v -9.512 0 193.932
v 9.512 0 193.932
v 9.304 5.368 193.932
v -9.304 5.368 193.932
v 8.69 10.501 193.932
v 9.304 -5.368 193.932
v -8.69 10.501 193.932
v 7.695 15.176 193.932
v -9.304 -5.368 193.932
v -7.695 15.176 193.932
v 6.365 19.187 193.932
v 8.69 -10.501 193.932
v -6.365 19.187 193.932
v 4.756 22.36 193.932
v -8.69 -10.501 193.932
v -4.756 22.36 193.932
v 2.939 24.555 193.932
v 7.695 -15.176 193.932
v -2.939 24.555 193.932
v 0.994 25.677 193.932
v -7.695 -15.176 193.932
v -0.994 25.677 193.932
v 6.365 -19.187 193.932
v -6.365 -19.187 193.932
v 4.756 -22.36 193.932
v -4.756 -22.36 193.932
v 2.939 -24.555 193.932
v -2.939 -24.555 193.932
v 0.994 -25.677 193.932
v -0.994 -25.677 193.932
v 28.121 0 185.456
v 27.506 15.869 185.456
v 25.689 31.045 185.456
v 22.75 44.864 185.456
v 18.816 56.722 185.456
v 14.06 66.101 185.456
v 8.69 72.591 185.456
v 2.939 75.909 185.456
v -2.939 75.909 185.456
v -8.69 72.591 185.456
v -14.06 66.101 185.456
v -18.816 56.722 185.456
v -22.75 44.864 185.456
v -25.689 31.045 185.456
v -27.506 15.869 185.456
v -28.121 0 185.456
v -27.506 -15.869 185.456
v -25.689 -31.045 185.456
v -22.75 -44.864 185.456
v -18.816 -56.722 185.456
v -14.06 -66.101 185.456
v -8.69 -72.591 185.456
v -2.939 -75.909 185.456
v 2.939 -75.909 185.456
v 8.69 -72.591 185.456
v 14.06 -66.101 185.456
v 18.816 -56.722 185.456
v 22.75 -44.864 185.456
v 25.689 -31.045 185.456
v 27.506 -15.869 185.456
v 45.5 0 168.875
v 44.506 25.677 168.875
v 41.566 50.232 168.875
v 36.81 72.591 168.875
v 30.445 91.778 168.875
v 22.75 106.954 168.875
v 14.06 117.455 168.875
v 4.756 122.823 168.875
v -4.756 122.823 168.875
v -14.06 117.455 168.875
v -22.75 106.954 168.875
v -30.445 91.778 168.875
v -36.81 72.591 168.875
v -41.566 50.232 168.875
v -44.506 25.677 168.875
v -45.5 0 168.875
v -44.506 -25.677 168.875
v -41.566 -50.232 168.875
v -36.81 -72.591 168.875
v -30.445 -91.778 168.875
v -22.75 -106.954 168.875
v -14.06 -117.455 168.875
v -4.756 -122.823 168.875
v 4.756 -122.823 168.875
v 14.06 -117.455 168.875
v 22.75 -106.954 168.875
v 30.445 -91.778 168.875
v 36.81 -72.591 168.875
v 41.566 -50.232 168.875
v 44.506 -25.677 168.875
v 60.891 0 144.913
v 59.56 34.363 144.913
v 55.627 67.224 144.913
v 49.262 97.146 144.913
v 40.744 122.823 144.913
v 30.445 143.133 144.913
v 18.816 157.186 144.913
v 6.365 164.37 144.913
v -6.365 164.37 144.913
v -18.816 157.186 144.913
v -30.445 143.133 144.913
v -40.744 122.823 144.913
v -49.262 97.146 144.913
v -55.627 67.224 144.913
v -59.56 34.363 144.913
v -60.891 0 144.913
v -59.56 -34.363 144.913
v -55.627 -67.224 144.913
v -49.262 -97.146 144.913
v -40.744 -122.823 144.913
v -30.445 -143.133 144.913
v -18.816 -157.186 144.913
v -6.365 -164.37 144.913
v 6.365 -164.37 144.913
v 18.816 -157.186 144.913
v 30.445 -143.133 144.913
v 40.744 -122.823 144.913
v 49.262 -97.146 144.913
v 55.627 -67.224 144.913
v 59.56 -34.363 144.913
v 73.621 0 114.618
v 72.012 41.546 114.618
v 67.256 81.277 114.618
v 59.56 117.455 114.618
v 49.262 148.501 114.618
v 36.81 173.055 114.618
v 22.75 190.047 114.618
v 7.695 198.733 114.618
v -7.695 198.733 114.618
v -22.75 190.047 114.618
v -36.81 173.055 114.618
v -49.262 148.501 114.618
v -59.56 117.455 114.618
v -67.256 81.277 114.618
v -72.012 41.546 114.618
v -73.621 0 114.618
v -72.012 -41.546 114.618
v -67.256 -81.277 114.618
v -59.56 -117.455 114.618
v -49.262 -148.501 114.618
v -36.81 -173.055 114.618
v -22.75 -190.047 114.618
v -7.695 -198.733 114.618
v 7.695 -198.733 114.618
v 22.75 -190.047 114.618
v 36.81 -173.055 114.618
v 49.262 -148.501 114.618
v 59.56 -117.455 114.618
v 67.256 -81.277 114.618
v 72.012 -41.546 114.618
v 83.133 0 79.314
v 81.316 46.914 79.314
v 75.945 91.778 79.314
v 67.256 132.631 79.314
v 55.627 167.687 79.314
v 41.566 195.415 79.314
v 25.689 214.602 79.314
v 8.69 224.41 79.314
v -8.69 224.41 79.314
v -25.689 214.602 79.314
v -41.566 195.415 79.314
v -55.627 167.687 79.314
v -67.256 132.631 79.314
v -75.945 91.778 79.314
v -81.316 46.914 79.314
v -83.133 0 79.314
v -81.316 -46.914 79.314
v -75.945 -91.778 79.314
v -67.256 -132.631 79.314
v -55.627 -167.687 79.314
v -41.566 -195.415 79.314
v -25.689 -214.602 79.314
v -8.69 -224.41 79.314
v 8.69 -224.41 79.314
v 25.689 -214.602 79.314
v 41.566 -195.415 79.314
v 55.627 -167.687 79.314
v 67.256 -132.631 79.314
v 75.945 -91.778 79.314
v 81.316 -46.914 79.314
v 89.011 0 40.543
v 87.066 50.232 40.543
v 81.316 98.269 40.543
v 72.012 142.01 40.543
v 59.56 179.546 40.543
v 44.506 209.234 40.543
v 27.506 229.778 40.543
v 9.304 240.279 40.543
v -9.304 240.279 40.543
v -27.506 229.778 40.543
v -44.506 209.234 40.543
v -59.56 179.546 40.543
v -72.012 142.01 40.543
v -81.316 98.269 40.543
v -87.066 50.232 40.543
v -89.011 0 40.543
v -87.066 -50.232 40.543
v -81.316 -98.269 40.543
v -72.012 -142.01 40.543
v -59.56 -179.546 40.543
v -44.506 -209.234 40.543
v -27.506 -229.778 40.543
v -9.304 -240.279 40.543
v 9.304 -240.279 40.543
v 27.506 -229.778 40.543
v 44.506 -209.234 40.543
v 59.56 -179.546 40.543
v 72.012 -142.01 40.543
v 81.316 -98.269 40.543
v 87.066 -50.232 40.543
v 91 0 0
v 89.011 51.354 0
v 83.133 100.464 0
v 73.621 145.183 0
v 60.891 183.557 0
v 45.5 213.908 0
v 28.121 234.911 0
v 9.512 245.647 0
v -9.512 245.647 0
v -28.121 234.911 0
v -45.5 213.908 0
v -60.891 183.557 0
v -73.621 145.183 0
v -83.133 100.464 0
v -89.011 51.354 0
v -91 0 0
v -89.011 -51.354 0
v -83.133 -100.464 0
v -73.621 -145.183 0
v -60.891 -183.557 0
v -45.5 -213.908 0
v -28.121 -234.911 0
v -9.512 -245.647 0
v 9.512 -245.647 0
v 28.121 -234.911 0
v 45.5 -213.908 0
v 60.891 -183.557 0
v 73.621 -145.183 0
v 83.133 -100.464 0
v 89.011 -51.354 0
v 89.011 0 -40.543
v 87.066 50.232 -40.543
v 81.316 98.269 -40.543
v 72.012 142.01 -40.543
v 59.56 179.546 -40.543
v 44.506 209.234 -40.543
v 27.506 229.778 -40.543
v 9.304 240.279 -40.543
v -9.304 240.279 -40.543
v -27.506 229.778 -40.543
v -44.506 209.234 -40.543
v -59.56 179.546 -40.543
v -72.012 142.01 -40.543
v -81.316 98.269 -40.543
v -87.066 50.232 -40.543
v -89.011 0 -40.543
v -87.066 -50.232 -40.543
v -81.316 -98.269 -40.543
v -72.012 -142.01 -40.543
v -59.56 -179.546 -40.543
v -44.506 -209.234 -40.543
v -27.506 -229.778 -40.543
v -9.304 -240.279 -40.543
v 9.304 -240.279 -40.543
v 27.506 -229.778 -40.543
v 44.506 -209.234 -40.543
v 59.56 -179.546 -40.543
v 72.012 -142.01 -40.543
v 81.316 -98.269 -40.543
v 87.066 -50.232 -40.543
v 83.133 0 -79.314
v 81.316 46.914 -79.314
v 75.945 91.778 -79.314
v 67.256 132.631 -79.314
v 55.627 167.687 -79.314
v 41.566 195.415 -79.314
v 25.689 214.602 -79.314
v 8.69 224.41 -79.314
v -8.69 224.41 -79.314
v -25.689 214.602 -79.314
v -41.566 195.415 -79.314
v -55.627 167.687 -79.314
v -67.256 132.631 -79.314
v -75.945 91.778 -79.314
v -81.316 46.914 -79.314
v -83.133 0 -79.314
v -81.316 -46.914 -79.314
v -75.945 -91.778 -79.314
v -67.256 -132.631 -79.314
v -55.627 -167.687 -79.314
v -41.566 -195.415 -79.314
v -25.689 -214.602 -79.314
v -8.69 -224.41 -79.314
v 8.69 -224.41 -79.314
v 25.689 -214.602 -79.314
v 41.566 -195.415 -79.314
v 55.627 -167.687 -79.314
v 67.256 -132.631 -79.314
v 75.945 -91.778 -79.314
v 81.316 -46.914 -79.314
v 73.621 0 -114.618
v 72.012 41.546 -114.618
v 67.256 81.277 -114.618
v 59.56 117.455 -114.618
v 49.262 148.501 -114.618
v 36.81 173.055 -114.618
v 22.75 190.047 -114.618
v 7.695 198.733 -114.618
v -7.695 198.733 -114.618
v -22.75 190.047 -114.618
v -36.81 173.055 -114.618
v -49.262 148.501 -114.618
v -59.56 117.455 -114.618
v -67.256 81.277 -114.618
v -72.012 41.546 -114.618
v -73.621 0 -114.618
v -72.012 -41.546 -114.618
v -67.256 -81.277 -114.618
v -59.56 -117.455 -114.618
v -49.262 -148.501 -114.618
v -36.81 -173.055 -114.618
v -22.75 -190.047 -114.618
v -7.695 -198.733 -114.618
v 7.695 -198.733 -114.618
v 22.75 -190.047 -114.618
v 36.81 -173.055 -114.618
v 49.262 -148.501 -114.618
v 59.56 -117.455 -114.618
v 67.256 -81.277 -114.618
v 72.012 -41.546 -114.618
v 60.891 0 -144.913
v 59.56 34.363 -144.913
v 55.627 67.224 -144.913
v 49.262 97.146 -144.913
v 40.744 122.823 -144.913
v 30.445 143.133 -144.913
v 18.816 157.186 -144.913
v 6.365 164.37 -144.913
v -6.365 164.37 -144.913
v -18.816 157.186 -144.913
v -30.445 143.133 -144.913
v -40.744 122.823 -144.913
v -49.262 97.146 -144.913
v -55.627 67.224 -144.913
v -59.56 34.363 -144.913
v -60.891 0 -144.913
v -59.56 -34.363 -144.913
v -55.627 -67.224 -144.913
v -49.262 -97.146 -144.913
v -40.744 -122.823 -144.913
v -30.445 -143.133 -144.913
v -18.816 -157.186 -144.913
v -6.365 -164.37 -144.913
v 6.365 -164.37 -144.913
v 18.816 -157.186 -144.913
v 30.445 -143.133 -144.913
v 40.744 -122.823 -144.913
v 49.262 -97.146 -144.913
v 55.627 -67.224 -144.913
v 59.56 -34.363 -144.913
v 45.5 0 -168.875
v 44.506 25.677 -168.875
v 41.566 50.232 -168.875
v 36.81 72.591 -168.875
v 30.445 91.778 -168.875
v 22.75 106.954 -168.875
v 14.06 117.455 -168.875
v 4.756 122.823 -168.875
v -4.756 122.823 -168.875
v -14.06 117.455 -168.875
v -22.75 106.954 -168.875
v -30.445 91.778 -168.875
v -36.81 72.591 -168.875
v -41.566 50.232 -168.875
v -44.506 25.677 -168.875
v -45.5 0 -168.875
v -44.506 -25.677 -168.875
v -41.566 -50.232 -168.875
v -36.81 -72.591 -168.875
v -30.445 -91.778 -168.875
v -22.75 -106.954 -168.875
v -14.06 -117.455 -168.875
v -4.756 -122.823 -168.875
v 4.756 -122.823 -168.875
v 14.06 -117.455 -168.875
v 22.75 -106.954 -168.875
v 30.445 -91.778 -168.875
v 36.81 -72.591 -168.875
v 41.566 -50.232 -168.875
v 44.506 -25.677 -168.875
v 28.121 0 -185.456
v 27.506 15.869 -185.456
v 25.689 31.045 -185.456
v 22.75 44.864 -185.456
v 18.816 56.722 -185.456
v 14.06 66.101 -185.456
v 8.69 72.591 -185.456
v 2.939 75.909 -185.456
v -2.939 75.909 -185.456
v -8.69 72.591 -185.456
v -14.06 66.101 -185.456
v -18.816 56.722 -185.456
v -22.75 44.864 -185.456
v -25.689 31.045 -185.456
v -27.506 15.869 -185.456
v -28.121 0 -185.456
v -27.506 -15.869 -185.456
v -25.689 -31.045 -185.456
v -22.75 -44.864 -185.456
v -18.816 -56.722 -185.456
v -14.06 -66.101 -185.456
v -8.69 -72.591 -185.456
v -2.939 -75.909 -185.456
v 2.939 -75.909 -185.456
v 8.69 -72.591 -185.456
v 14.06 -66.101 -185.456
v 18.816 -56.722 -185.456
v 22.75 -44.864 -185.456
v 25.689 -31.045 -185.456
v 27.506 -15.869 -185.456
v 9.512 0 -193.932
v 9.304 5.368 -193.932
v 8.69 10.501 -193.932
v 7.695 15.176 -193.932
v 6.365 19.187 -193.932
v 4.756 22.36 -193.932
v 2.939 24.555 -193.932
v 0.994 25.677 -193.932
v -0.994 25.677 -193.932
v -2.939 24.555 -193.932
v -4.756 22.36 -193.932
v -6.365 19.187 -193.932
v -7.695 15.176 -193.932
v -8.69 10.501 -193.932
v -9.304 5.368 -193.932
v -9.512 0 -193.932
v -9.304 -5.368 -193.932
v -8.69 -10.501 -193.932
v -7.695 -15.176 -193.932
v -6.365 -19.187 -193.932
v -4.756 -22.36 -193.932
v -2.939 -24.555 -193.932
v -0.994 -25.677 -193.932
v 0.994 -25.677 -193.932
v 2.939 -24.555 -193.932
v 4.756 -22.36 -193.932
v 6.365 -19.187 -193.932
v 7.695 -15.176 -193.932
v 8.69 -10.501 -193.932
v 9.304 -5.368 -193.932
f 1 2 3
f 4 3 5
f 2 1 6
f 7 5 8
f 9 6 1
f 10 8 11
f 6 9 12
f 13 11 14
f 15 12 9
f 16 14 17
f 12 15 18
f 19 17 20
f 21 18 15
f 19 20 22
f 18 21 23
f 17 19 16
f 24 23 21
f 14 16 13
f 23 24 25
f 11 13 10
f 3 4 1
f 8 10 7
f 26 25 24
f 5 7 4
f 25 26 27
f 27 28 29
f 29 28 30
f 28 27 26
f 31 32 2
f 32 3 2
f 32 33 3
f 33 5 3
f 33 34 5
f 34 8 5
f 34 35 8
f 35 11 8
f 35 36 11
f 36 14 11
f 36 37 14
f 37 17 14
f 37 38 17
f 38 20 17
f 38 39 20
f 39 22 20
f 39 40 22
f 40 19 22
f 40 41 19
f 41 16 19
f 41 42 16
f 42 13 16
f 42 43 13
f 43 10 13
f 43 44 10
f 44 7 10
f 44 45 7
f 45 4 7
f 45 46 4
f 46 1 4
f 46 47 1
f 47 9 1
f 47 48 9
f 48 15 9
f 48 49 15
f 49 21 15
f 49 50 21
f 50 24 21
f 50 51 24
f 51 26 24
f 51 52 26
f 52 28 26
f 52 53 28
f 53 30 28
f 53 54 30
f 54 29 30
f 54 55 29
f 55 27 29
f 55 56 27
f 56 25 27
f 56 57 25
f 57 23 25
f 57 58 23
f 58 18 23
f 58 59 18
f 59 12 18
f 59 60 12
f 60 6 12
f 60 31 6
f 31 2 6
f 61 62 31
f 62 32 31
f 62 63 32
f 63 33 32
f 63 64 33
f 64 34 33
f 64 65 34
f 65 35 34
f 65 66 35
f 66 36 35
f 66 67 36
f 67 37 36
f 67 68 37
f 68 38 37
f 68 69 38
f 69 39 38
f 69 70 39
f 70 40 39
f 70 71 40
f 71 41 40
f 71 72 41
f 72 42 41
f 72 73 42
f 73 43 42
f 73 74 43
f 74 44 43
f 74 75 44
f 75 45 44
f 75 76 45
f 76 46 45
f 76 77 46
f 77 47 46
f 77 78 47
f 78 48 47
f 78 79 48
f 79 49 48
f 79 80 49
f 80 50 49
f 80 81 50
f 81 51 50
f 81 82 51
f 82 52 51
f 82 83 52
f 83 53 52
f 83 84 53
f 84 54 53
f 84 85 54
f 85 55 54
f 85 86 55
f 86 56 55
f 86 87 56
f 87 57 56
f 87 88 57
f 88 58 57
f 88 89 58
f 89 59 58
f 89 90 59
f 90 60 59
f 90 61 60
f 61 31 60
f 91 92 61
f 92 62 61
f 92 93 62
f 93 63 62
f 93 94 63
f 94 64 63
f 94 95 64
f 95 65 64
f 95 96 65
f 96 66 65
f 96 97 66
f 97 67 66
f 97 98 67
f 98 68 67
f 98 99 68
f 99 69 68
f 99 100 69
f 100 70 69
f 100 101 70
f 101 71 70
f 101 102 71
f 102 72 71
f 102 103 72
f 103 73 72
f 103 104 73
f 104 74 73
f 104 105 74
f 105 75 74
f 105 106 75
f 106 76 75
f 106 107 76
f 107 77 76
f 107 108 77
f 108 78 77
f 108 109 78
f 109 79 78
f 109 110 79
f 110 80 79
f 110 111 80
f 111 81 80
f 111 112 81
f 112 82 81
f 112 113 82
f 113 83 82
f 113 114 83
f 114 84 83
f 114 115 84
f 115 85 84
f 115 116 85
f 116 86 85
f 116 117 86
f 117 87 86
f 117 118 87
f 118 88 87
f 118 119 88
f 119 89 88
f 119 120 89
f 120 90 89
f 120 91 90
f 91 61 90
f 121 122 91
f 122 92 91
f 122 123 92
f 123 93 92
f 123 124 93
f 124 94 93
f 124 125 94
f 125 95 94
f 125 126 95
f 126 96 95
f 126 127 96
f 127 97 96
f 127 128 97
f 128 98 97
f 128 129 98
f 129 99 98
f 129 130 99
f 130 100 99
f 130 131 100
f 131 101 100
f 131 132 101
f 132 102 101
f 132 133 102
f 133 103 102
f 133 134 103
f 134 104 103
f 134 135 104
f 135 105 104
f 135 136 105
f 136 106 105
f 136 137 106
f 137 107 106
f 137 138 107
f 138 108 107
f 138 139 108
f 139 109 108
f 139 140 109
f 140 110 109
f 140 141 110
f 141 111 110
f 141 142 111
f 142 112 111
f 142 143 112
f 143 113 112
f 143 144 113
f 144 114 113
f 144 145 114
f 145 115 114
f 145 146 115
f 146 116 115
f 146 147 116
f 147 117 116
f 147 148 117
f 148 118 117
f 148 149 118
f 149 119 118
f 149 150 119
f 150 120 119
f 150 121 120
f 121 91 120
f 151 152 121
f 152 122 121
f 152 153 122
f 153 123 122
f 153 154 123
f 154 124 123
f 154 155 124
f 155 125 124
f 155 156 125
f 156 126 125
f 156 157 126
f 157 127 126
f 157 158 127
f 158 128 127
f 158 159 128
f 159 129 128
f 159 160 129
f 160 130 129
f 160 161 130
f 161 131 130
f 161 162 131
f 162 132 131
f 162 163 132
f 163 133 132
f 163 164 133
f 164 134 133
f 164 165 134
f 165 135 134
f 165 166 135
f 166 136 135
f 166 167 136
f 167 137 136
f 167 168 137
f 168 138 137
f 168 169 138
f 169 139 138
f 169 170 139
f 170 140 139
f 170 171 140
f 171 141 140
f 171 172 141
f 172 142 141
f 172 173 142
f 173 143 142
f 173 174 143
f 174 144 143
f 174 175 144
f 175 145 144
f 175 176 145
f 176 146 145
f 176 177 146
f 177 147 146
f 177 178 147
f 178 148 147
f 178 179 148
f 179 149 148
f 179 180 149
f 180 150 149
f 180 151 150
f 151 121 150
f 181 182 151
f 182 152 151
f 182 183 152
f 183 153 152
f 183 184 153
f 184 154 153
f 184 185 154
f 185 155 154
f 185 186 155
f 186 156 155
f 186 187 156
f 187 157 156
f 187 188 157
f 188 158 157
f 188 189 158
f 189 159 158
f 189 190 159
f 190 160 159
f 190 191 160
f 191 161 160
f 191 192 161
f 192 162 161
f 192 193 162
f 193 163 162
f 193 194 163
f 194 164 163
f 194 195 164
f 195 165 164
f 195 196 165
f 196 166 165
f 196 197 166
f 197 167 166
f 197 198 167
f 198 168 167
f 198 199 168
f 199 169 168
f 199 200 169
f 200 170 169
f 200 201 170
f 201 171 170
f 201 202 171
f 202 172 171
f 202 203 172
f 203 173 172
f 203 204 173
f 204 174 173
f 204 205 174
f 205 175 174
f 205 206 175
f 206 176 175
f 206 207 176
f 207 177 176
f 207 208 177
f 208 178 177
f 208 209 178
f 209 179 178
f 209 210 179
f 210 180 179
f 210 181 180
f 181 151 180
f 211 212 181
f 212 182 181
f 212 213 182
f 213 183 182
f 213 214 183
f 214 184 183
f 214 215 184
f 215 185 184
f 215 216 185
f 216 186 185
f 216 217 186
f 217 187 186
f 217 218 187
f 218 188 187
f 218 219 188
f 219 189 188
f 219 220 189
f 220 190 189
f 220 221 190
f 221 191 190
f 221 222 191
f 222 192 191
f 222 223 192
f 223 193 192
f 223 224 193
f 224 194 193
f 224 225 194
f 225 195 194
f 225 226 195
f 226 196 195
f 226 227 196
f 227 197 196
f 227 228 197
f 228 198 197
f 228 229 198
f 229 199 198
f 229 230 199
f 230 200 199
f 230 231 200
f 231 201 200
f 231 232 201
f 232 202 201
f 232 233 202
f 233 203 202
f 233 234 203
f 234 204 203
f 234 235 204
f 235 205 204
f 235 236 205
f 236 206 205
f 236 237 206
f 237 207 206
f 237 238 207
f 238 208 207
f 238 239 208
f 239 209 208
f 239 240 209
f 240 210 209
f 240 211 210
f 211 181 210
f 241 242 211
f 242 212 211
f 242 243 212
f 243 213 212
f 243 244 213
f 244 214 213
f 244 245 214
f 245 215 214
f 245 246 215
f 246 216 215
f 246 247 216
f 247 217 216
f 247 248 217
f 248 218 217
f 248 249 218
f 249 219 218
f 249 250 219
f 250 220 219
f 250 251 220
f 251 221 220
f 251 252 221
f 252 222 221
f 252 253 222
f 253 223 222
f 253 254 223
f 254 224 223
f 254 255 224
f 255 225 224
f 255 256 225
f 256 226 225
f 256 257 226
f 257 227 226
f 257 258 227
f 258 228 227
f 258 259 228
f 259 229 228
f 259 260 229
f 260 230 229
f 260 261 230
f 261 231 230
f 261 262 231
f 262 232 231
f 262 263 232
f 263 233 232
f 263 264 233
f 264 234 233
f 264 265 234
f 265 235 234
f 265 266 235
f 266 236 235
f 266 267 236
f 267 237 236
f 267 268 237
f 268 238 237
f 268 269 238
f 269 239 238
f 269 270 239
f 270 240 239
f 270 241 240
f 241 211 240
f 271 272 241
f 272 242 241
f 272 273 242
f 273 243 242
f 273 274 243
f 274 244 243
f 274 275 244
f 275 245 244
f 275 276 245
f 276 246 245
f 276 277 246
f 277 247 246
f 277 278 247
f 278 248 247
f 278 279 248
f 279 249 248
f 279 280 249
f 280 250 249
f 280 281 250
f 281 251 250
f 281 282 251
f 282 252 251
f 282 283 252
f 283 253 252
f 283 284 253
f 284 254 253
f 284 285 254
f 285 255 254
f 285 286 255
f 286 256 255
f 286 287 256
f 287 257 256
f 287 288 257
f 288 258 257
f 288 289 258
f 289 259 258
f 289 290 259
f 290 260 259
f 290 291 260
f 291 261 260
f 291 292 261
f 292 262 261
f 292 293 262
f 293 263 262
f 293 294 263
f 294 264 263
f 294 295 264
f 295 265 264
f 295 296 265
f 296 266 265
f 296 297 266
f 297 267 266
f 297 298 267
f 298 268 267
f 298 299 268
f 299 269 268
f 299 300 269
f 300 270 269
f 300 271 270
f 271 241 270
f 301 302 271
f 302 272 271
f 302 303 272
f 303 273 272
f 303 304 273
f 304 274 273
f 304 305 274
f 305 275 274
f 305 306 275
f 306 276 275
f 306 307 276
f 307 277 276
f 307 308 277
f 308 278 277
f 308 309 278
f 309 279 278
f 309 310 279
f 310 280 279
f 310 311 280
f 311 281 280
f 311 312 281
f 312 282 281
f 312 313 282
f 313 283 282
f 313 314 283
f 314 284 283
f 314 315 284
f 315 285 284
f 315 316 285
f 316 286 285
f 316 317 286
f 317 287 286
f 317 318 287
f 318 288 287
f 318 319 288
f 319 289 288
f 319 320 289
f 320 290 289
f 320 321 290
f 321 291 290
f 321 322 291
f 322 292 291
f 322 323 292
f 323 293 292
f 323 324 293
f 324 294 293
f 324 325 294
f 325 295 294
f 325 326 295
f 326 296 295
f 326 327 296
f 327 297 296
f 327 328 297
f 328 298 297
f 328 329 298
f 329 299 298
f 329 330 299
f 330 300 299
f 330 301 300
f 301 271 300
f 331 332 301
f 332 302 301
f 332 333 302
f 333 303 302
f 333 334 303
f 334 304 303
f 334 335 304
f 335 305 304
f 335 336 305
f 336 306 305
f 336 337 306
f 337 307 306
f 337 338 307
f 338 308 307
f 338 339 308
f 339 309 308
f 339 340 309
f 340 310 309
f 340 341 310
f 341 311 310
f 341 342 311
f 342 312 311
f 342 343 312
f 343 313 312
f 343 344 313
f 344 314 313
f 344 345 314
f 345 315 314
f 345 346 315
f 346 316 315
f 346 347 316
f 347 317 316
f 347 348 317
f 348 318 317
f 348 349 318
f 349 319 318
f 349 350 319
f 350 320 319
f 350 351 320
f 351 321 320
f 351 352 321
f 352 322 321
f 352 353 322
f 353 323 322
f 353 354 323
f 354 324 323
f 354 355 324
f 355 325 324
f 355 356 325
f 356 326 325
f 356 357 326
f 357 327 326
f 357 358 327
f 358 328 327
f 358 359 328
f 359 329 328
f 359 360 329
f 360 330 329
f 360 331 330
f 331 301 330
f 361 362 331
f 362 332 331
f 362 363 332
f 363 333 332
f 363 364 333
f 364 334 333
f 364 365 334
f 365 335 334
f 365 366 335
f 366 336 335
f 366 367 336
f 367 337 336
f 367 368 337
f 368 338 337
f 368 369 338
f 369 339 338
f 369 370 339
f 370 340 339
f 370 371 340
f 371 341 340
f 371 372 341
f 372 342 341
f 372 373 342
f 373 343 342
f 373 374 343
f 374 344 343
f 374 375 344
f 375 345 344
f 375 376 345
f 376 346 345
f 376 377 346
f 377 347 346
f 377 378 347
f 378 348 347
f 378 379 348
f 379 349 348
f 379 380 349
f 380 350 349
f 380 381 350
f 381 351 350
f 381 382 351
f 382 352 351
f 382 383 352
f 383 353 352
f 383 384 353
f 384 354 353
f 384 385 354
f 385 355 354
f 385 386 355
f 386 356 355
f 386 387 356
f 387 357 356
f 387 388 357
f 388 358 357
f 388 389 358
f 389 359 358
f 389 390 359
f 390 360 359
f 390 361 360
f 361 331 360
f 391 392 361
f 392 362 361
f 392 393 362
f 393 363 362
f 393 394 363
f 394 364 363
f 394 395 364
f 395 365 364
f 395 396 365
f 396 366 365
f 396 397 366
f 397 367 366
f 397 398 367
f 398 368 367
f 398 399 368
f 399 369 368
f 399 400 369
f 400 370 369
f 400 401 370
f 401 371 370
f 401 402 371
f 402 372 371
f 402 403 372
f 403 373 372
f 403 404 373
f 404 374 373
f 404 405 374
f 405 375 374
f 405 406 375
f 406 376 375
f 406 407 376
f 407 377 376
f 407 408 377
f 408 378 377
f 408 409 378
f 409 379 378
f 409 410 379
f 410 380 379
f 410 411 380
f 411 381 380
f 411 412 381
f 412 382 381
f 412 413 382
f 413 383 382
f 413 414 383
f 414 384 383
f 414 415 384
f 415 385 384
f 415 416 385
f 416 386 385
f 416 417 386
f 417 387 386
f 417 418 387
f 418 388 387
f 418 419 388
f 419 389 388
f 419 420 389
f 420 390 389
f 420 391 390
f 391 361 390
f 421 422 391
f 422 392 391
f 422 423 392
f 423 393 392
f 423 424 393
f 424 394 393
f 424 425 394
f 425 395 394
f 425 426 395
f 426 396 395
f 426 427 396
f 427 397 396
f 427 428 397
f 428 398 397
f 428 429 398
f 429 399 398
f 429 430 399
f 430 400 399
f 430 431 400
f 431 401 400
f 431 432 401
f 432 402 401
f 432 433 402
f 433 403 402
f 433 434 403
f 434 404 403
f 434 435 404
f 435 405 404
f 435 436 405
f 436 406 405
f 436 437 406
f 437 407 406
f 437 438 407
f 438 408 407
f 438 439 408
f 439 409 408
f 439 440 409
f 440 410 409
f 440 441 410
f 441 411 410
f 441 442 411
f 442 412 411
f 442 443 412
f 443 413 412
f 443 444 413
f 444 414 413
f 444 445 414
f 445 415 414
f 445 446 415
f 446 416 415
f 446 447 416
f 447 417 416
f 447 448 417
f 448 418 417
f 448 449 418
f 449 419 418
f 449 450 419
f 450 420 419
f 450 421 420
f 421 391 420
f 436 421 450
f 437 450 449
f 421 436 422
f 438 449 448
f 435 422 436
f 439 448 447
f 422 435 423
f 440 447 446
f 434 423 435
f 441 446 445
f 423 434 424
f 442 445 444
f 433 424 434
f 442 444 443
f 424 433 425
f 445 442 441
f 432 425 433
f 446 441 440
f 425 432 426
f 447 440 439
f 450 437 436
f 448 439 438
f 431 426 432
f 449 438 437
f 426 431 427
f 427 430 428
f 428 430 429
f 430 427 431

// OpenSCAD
// Generated by SolidPython 1.0.1 on 2020-07-29 00:46:48


scale(v = [7, 19, 15]) {
	sphere(r = 13);
}
/***********************************************
*********      SolidPython code:      **********
************************************************
 
# import packages: SolidPython
from solid import *
from solid.utils import *
from itertools import chain, combinations, permutations


class Resize:

    def __init__(self, scad_file):
        self.scad_file = scad_file
        #self.scad_file = import_scad(scad_file)
        # cone/cylinder param:
        self.r1 = 0
        self.r2 = 0
        self.h = 0
        # rectangular prism param:
        self.w = 0
        self.l = 0
        # ellipse param:
        self.r = 0

    # import OpenScad code (file name corresponds to shape)


    # classify shape + parameters
    def assign(self, param1, param2, param3):
        if self.scad_file == 'cone.scad':
            self.r1 = param1
            self.r2 = param2
            self.h = param3
        elif self.scad_file == 'cylinder.scad':
            self.r1 = param1
            self.r2 = param2
            self.h = param3
        elif self.scad_file == 'rectangularPrism.scad':
            self.h = param1
            self.l = param2
            self.w = param3
        else:
            self.r = param1
            self.h = param2

    # resize parameters
    def iterate(self):
        x = range(3, 20, 2)
        i = 1
        if self.scad_file == 'cone.scad':
            tempList = list(permutations(x, 2))
            for temp in tempList:
                param1 = temp[0]
                param2 = temp[1]
                filepath = 'produced_scad_files/' + 'cone' + str(param1) + '_' + str(param2) + '_' + '.scad'
                scad_render_to_file(cylinder(h=param1, r1=param2, r2=0), filepath)

        elif self.scad_file == 'cylinder.scad':
            tempList = list(permutations(x, 3))
            for temp in tempList:
                param1 = temp[0]
                param2 = temp[1]
                filepath = 'produced_scad_files/' + 'cylinder' + str(param1) + '_' + str(param2) + '_' + '.scad'
                scad_render_to_file(cylinder(h=param1, r1=param2, r2=param2), filepath)

        elif self.scad_file == 'rectangularPrism.scad':
            tempList = list(permutations(x, 3))
            for temp in tempList:
                param1 = temp[0]
                param2 = temp[1]
                param3 = temp[2]
                filepath = 'produced_scad_files/' + 'rectangularPrism' + str(param1) + '_' + str(param2) + '_' + str(
                    param3) + '.scad'
                scad_render_to_file(cube(size=(param1, param2, param3)), filepath)

        elif self.scad_file == 'ellipse.scad':
            tempList = list(permutations(x, 4))
            for temp in tempList:
                param1 = temp[0]
                param2 = temp[1]
                param3 = temp[2]
                param4 = temp[3]
                filepath = 'produced_scad_files/' + 'ellipse' + str(param1) + '_' + str(param2) + '_' + str(param3) + '_' + str(param4) + '.scad'
                scad_render_to_file(scale([param1, param2, param3])(sphere(r=param4)), filepath)

    def render_to_scadfile(self):
        scad_render_to_file(scad, 'example.scad') 
 
************************************************/
